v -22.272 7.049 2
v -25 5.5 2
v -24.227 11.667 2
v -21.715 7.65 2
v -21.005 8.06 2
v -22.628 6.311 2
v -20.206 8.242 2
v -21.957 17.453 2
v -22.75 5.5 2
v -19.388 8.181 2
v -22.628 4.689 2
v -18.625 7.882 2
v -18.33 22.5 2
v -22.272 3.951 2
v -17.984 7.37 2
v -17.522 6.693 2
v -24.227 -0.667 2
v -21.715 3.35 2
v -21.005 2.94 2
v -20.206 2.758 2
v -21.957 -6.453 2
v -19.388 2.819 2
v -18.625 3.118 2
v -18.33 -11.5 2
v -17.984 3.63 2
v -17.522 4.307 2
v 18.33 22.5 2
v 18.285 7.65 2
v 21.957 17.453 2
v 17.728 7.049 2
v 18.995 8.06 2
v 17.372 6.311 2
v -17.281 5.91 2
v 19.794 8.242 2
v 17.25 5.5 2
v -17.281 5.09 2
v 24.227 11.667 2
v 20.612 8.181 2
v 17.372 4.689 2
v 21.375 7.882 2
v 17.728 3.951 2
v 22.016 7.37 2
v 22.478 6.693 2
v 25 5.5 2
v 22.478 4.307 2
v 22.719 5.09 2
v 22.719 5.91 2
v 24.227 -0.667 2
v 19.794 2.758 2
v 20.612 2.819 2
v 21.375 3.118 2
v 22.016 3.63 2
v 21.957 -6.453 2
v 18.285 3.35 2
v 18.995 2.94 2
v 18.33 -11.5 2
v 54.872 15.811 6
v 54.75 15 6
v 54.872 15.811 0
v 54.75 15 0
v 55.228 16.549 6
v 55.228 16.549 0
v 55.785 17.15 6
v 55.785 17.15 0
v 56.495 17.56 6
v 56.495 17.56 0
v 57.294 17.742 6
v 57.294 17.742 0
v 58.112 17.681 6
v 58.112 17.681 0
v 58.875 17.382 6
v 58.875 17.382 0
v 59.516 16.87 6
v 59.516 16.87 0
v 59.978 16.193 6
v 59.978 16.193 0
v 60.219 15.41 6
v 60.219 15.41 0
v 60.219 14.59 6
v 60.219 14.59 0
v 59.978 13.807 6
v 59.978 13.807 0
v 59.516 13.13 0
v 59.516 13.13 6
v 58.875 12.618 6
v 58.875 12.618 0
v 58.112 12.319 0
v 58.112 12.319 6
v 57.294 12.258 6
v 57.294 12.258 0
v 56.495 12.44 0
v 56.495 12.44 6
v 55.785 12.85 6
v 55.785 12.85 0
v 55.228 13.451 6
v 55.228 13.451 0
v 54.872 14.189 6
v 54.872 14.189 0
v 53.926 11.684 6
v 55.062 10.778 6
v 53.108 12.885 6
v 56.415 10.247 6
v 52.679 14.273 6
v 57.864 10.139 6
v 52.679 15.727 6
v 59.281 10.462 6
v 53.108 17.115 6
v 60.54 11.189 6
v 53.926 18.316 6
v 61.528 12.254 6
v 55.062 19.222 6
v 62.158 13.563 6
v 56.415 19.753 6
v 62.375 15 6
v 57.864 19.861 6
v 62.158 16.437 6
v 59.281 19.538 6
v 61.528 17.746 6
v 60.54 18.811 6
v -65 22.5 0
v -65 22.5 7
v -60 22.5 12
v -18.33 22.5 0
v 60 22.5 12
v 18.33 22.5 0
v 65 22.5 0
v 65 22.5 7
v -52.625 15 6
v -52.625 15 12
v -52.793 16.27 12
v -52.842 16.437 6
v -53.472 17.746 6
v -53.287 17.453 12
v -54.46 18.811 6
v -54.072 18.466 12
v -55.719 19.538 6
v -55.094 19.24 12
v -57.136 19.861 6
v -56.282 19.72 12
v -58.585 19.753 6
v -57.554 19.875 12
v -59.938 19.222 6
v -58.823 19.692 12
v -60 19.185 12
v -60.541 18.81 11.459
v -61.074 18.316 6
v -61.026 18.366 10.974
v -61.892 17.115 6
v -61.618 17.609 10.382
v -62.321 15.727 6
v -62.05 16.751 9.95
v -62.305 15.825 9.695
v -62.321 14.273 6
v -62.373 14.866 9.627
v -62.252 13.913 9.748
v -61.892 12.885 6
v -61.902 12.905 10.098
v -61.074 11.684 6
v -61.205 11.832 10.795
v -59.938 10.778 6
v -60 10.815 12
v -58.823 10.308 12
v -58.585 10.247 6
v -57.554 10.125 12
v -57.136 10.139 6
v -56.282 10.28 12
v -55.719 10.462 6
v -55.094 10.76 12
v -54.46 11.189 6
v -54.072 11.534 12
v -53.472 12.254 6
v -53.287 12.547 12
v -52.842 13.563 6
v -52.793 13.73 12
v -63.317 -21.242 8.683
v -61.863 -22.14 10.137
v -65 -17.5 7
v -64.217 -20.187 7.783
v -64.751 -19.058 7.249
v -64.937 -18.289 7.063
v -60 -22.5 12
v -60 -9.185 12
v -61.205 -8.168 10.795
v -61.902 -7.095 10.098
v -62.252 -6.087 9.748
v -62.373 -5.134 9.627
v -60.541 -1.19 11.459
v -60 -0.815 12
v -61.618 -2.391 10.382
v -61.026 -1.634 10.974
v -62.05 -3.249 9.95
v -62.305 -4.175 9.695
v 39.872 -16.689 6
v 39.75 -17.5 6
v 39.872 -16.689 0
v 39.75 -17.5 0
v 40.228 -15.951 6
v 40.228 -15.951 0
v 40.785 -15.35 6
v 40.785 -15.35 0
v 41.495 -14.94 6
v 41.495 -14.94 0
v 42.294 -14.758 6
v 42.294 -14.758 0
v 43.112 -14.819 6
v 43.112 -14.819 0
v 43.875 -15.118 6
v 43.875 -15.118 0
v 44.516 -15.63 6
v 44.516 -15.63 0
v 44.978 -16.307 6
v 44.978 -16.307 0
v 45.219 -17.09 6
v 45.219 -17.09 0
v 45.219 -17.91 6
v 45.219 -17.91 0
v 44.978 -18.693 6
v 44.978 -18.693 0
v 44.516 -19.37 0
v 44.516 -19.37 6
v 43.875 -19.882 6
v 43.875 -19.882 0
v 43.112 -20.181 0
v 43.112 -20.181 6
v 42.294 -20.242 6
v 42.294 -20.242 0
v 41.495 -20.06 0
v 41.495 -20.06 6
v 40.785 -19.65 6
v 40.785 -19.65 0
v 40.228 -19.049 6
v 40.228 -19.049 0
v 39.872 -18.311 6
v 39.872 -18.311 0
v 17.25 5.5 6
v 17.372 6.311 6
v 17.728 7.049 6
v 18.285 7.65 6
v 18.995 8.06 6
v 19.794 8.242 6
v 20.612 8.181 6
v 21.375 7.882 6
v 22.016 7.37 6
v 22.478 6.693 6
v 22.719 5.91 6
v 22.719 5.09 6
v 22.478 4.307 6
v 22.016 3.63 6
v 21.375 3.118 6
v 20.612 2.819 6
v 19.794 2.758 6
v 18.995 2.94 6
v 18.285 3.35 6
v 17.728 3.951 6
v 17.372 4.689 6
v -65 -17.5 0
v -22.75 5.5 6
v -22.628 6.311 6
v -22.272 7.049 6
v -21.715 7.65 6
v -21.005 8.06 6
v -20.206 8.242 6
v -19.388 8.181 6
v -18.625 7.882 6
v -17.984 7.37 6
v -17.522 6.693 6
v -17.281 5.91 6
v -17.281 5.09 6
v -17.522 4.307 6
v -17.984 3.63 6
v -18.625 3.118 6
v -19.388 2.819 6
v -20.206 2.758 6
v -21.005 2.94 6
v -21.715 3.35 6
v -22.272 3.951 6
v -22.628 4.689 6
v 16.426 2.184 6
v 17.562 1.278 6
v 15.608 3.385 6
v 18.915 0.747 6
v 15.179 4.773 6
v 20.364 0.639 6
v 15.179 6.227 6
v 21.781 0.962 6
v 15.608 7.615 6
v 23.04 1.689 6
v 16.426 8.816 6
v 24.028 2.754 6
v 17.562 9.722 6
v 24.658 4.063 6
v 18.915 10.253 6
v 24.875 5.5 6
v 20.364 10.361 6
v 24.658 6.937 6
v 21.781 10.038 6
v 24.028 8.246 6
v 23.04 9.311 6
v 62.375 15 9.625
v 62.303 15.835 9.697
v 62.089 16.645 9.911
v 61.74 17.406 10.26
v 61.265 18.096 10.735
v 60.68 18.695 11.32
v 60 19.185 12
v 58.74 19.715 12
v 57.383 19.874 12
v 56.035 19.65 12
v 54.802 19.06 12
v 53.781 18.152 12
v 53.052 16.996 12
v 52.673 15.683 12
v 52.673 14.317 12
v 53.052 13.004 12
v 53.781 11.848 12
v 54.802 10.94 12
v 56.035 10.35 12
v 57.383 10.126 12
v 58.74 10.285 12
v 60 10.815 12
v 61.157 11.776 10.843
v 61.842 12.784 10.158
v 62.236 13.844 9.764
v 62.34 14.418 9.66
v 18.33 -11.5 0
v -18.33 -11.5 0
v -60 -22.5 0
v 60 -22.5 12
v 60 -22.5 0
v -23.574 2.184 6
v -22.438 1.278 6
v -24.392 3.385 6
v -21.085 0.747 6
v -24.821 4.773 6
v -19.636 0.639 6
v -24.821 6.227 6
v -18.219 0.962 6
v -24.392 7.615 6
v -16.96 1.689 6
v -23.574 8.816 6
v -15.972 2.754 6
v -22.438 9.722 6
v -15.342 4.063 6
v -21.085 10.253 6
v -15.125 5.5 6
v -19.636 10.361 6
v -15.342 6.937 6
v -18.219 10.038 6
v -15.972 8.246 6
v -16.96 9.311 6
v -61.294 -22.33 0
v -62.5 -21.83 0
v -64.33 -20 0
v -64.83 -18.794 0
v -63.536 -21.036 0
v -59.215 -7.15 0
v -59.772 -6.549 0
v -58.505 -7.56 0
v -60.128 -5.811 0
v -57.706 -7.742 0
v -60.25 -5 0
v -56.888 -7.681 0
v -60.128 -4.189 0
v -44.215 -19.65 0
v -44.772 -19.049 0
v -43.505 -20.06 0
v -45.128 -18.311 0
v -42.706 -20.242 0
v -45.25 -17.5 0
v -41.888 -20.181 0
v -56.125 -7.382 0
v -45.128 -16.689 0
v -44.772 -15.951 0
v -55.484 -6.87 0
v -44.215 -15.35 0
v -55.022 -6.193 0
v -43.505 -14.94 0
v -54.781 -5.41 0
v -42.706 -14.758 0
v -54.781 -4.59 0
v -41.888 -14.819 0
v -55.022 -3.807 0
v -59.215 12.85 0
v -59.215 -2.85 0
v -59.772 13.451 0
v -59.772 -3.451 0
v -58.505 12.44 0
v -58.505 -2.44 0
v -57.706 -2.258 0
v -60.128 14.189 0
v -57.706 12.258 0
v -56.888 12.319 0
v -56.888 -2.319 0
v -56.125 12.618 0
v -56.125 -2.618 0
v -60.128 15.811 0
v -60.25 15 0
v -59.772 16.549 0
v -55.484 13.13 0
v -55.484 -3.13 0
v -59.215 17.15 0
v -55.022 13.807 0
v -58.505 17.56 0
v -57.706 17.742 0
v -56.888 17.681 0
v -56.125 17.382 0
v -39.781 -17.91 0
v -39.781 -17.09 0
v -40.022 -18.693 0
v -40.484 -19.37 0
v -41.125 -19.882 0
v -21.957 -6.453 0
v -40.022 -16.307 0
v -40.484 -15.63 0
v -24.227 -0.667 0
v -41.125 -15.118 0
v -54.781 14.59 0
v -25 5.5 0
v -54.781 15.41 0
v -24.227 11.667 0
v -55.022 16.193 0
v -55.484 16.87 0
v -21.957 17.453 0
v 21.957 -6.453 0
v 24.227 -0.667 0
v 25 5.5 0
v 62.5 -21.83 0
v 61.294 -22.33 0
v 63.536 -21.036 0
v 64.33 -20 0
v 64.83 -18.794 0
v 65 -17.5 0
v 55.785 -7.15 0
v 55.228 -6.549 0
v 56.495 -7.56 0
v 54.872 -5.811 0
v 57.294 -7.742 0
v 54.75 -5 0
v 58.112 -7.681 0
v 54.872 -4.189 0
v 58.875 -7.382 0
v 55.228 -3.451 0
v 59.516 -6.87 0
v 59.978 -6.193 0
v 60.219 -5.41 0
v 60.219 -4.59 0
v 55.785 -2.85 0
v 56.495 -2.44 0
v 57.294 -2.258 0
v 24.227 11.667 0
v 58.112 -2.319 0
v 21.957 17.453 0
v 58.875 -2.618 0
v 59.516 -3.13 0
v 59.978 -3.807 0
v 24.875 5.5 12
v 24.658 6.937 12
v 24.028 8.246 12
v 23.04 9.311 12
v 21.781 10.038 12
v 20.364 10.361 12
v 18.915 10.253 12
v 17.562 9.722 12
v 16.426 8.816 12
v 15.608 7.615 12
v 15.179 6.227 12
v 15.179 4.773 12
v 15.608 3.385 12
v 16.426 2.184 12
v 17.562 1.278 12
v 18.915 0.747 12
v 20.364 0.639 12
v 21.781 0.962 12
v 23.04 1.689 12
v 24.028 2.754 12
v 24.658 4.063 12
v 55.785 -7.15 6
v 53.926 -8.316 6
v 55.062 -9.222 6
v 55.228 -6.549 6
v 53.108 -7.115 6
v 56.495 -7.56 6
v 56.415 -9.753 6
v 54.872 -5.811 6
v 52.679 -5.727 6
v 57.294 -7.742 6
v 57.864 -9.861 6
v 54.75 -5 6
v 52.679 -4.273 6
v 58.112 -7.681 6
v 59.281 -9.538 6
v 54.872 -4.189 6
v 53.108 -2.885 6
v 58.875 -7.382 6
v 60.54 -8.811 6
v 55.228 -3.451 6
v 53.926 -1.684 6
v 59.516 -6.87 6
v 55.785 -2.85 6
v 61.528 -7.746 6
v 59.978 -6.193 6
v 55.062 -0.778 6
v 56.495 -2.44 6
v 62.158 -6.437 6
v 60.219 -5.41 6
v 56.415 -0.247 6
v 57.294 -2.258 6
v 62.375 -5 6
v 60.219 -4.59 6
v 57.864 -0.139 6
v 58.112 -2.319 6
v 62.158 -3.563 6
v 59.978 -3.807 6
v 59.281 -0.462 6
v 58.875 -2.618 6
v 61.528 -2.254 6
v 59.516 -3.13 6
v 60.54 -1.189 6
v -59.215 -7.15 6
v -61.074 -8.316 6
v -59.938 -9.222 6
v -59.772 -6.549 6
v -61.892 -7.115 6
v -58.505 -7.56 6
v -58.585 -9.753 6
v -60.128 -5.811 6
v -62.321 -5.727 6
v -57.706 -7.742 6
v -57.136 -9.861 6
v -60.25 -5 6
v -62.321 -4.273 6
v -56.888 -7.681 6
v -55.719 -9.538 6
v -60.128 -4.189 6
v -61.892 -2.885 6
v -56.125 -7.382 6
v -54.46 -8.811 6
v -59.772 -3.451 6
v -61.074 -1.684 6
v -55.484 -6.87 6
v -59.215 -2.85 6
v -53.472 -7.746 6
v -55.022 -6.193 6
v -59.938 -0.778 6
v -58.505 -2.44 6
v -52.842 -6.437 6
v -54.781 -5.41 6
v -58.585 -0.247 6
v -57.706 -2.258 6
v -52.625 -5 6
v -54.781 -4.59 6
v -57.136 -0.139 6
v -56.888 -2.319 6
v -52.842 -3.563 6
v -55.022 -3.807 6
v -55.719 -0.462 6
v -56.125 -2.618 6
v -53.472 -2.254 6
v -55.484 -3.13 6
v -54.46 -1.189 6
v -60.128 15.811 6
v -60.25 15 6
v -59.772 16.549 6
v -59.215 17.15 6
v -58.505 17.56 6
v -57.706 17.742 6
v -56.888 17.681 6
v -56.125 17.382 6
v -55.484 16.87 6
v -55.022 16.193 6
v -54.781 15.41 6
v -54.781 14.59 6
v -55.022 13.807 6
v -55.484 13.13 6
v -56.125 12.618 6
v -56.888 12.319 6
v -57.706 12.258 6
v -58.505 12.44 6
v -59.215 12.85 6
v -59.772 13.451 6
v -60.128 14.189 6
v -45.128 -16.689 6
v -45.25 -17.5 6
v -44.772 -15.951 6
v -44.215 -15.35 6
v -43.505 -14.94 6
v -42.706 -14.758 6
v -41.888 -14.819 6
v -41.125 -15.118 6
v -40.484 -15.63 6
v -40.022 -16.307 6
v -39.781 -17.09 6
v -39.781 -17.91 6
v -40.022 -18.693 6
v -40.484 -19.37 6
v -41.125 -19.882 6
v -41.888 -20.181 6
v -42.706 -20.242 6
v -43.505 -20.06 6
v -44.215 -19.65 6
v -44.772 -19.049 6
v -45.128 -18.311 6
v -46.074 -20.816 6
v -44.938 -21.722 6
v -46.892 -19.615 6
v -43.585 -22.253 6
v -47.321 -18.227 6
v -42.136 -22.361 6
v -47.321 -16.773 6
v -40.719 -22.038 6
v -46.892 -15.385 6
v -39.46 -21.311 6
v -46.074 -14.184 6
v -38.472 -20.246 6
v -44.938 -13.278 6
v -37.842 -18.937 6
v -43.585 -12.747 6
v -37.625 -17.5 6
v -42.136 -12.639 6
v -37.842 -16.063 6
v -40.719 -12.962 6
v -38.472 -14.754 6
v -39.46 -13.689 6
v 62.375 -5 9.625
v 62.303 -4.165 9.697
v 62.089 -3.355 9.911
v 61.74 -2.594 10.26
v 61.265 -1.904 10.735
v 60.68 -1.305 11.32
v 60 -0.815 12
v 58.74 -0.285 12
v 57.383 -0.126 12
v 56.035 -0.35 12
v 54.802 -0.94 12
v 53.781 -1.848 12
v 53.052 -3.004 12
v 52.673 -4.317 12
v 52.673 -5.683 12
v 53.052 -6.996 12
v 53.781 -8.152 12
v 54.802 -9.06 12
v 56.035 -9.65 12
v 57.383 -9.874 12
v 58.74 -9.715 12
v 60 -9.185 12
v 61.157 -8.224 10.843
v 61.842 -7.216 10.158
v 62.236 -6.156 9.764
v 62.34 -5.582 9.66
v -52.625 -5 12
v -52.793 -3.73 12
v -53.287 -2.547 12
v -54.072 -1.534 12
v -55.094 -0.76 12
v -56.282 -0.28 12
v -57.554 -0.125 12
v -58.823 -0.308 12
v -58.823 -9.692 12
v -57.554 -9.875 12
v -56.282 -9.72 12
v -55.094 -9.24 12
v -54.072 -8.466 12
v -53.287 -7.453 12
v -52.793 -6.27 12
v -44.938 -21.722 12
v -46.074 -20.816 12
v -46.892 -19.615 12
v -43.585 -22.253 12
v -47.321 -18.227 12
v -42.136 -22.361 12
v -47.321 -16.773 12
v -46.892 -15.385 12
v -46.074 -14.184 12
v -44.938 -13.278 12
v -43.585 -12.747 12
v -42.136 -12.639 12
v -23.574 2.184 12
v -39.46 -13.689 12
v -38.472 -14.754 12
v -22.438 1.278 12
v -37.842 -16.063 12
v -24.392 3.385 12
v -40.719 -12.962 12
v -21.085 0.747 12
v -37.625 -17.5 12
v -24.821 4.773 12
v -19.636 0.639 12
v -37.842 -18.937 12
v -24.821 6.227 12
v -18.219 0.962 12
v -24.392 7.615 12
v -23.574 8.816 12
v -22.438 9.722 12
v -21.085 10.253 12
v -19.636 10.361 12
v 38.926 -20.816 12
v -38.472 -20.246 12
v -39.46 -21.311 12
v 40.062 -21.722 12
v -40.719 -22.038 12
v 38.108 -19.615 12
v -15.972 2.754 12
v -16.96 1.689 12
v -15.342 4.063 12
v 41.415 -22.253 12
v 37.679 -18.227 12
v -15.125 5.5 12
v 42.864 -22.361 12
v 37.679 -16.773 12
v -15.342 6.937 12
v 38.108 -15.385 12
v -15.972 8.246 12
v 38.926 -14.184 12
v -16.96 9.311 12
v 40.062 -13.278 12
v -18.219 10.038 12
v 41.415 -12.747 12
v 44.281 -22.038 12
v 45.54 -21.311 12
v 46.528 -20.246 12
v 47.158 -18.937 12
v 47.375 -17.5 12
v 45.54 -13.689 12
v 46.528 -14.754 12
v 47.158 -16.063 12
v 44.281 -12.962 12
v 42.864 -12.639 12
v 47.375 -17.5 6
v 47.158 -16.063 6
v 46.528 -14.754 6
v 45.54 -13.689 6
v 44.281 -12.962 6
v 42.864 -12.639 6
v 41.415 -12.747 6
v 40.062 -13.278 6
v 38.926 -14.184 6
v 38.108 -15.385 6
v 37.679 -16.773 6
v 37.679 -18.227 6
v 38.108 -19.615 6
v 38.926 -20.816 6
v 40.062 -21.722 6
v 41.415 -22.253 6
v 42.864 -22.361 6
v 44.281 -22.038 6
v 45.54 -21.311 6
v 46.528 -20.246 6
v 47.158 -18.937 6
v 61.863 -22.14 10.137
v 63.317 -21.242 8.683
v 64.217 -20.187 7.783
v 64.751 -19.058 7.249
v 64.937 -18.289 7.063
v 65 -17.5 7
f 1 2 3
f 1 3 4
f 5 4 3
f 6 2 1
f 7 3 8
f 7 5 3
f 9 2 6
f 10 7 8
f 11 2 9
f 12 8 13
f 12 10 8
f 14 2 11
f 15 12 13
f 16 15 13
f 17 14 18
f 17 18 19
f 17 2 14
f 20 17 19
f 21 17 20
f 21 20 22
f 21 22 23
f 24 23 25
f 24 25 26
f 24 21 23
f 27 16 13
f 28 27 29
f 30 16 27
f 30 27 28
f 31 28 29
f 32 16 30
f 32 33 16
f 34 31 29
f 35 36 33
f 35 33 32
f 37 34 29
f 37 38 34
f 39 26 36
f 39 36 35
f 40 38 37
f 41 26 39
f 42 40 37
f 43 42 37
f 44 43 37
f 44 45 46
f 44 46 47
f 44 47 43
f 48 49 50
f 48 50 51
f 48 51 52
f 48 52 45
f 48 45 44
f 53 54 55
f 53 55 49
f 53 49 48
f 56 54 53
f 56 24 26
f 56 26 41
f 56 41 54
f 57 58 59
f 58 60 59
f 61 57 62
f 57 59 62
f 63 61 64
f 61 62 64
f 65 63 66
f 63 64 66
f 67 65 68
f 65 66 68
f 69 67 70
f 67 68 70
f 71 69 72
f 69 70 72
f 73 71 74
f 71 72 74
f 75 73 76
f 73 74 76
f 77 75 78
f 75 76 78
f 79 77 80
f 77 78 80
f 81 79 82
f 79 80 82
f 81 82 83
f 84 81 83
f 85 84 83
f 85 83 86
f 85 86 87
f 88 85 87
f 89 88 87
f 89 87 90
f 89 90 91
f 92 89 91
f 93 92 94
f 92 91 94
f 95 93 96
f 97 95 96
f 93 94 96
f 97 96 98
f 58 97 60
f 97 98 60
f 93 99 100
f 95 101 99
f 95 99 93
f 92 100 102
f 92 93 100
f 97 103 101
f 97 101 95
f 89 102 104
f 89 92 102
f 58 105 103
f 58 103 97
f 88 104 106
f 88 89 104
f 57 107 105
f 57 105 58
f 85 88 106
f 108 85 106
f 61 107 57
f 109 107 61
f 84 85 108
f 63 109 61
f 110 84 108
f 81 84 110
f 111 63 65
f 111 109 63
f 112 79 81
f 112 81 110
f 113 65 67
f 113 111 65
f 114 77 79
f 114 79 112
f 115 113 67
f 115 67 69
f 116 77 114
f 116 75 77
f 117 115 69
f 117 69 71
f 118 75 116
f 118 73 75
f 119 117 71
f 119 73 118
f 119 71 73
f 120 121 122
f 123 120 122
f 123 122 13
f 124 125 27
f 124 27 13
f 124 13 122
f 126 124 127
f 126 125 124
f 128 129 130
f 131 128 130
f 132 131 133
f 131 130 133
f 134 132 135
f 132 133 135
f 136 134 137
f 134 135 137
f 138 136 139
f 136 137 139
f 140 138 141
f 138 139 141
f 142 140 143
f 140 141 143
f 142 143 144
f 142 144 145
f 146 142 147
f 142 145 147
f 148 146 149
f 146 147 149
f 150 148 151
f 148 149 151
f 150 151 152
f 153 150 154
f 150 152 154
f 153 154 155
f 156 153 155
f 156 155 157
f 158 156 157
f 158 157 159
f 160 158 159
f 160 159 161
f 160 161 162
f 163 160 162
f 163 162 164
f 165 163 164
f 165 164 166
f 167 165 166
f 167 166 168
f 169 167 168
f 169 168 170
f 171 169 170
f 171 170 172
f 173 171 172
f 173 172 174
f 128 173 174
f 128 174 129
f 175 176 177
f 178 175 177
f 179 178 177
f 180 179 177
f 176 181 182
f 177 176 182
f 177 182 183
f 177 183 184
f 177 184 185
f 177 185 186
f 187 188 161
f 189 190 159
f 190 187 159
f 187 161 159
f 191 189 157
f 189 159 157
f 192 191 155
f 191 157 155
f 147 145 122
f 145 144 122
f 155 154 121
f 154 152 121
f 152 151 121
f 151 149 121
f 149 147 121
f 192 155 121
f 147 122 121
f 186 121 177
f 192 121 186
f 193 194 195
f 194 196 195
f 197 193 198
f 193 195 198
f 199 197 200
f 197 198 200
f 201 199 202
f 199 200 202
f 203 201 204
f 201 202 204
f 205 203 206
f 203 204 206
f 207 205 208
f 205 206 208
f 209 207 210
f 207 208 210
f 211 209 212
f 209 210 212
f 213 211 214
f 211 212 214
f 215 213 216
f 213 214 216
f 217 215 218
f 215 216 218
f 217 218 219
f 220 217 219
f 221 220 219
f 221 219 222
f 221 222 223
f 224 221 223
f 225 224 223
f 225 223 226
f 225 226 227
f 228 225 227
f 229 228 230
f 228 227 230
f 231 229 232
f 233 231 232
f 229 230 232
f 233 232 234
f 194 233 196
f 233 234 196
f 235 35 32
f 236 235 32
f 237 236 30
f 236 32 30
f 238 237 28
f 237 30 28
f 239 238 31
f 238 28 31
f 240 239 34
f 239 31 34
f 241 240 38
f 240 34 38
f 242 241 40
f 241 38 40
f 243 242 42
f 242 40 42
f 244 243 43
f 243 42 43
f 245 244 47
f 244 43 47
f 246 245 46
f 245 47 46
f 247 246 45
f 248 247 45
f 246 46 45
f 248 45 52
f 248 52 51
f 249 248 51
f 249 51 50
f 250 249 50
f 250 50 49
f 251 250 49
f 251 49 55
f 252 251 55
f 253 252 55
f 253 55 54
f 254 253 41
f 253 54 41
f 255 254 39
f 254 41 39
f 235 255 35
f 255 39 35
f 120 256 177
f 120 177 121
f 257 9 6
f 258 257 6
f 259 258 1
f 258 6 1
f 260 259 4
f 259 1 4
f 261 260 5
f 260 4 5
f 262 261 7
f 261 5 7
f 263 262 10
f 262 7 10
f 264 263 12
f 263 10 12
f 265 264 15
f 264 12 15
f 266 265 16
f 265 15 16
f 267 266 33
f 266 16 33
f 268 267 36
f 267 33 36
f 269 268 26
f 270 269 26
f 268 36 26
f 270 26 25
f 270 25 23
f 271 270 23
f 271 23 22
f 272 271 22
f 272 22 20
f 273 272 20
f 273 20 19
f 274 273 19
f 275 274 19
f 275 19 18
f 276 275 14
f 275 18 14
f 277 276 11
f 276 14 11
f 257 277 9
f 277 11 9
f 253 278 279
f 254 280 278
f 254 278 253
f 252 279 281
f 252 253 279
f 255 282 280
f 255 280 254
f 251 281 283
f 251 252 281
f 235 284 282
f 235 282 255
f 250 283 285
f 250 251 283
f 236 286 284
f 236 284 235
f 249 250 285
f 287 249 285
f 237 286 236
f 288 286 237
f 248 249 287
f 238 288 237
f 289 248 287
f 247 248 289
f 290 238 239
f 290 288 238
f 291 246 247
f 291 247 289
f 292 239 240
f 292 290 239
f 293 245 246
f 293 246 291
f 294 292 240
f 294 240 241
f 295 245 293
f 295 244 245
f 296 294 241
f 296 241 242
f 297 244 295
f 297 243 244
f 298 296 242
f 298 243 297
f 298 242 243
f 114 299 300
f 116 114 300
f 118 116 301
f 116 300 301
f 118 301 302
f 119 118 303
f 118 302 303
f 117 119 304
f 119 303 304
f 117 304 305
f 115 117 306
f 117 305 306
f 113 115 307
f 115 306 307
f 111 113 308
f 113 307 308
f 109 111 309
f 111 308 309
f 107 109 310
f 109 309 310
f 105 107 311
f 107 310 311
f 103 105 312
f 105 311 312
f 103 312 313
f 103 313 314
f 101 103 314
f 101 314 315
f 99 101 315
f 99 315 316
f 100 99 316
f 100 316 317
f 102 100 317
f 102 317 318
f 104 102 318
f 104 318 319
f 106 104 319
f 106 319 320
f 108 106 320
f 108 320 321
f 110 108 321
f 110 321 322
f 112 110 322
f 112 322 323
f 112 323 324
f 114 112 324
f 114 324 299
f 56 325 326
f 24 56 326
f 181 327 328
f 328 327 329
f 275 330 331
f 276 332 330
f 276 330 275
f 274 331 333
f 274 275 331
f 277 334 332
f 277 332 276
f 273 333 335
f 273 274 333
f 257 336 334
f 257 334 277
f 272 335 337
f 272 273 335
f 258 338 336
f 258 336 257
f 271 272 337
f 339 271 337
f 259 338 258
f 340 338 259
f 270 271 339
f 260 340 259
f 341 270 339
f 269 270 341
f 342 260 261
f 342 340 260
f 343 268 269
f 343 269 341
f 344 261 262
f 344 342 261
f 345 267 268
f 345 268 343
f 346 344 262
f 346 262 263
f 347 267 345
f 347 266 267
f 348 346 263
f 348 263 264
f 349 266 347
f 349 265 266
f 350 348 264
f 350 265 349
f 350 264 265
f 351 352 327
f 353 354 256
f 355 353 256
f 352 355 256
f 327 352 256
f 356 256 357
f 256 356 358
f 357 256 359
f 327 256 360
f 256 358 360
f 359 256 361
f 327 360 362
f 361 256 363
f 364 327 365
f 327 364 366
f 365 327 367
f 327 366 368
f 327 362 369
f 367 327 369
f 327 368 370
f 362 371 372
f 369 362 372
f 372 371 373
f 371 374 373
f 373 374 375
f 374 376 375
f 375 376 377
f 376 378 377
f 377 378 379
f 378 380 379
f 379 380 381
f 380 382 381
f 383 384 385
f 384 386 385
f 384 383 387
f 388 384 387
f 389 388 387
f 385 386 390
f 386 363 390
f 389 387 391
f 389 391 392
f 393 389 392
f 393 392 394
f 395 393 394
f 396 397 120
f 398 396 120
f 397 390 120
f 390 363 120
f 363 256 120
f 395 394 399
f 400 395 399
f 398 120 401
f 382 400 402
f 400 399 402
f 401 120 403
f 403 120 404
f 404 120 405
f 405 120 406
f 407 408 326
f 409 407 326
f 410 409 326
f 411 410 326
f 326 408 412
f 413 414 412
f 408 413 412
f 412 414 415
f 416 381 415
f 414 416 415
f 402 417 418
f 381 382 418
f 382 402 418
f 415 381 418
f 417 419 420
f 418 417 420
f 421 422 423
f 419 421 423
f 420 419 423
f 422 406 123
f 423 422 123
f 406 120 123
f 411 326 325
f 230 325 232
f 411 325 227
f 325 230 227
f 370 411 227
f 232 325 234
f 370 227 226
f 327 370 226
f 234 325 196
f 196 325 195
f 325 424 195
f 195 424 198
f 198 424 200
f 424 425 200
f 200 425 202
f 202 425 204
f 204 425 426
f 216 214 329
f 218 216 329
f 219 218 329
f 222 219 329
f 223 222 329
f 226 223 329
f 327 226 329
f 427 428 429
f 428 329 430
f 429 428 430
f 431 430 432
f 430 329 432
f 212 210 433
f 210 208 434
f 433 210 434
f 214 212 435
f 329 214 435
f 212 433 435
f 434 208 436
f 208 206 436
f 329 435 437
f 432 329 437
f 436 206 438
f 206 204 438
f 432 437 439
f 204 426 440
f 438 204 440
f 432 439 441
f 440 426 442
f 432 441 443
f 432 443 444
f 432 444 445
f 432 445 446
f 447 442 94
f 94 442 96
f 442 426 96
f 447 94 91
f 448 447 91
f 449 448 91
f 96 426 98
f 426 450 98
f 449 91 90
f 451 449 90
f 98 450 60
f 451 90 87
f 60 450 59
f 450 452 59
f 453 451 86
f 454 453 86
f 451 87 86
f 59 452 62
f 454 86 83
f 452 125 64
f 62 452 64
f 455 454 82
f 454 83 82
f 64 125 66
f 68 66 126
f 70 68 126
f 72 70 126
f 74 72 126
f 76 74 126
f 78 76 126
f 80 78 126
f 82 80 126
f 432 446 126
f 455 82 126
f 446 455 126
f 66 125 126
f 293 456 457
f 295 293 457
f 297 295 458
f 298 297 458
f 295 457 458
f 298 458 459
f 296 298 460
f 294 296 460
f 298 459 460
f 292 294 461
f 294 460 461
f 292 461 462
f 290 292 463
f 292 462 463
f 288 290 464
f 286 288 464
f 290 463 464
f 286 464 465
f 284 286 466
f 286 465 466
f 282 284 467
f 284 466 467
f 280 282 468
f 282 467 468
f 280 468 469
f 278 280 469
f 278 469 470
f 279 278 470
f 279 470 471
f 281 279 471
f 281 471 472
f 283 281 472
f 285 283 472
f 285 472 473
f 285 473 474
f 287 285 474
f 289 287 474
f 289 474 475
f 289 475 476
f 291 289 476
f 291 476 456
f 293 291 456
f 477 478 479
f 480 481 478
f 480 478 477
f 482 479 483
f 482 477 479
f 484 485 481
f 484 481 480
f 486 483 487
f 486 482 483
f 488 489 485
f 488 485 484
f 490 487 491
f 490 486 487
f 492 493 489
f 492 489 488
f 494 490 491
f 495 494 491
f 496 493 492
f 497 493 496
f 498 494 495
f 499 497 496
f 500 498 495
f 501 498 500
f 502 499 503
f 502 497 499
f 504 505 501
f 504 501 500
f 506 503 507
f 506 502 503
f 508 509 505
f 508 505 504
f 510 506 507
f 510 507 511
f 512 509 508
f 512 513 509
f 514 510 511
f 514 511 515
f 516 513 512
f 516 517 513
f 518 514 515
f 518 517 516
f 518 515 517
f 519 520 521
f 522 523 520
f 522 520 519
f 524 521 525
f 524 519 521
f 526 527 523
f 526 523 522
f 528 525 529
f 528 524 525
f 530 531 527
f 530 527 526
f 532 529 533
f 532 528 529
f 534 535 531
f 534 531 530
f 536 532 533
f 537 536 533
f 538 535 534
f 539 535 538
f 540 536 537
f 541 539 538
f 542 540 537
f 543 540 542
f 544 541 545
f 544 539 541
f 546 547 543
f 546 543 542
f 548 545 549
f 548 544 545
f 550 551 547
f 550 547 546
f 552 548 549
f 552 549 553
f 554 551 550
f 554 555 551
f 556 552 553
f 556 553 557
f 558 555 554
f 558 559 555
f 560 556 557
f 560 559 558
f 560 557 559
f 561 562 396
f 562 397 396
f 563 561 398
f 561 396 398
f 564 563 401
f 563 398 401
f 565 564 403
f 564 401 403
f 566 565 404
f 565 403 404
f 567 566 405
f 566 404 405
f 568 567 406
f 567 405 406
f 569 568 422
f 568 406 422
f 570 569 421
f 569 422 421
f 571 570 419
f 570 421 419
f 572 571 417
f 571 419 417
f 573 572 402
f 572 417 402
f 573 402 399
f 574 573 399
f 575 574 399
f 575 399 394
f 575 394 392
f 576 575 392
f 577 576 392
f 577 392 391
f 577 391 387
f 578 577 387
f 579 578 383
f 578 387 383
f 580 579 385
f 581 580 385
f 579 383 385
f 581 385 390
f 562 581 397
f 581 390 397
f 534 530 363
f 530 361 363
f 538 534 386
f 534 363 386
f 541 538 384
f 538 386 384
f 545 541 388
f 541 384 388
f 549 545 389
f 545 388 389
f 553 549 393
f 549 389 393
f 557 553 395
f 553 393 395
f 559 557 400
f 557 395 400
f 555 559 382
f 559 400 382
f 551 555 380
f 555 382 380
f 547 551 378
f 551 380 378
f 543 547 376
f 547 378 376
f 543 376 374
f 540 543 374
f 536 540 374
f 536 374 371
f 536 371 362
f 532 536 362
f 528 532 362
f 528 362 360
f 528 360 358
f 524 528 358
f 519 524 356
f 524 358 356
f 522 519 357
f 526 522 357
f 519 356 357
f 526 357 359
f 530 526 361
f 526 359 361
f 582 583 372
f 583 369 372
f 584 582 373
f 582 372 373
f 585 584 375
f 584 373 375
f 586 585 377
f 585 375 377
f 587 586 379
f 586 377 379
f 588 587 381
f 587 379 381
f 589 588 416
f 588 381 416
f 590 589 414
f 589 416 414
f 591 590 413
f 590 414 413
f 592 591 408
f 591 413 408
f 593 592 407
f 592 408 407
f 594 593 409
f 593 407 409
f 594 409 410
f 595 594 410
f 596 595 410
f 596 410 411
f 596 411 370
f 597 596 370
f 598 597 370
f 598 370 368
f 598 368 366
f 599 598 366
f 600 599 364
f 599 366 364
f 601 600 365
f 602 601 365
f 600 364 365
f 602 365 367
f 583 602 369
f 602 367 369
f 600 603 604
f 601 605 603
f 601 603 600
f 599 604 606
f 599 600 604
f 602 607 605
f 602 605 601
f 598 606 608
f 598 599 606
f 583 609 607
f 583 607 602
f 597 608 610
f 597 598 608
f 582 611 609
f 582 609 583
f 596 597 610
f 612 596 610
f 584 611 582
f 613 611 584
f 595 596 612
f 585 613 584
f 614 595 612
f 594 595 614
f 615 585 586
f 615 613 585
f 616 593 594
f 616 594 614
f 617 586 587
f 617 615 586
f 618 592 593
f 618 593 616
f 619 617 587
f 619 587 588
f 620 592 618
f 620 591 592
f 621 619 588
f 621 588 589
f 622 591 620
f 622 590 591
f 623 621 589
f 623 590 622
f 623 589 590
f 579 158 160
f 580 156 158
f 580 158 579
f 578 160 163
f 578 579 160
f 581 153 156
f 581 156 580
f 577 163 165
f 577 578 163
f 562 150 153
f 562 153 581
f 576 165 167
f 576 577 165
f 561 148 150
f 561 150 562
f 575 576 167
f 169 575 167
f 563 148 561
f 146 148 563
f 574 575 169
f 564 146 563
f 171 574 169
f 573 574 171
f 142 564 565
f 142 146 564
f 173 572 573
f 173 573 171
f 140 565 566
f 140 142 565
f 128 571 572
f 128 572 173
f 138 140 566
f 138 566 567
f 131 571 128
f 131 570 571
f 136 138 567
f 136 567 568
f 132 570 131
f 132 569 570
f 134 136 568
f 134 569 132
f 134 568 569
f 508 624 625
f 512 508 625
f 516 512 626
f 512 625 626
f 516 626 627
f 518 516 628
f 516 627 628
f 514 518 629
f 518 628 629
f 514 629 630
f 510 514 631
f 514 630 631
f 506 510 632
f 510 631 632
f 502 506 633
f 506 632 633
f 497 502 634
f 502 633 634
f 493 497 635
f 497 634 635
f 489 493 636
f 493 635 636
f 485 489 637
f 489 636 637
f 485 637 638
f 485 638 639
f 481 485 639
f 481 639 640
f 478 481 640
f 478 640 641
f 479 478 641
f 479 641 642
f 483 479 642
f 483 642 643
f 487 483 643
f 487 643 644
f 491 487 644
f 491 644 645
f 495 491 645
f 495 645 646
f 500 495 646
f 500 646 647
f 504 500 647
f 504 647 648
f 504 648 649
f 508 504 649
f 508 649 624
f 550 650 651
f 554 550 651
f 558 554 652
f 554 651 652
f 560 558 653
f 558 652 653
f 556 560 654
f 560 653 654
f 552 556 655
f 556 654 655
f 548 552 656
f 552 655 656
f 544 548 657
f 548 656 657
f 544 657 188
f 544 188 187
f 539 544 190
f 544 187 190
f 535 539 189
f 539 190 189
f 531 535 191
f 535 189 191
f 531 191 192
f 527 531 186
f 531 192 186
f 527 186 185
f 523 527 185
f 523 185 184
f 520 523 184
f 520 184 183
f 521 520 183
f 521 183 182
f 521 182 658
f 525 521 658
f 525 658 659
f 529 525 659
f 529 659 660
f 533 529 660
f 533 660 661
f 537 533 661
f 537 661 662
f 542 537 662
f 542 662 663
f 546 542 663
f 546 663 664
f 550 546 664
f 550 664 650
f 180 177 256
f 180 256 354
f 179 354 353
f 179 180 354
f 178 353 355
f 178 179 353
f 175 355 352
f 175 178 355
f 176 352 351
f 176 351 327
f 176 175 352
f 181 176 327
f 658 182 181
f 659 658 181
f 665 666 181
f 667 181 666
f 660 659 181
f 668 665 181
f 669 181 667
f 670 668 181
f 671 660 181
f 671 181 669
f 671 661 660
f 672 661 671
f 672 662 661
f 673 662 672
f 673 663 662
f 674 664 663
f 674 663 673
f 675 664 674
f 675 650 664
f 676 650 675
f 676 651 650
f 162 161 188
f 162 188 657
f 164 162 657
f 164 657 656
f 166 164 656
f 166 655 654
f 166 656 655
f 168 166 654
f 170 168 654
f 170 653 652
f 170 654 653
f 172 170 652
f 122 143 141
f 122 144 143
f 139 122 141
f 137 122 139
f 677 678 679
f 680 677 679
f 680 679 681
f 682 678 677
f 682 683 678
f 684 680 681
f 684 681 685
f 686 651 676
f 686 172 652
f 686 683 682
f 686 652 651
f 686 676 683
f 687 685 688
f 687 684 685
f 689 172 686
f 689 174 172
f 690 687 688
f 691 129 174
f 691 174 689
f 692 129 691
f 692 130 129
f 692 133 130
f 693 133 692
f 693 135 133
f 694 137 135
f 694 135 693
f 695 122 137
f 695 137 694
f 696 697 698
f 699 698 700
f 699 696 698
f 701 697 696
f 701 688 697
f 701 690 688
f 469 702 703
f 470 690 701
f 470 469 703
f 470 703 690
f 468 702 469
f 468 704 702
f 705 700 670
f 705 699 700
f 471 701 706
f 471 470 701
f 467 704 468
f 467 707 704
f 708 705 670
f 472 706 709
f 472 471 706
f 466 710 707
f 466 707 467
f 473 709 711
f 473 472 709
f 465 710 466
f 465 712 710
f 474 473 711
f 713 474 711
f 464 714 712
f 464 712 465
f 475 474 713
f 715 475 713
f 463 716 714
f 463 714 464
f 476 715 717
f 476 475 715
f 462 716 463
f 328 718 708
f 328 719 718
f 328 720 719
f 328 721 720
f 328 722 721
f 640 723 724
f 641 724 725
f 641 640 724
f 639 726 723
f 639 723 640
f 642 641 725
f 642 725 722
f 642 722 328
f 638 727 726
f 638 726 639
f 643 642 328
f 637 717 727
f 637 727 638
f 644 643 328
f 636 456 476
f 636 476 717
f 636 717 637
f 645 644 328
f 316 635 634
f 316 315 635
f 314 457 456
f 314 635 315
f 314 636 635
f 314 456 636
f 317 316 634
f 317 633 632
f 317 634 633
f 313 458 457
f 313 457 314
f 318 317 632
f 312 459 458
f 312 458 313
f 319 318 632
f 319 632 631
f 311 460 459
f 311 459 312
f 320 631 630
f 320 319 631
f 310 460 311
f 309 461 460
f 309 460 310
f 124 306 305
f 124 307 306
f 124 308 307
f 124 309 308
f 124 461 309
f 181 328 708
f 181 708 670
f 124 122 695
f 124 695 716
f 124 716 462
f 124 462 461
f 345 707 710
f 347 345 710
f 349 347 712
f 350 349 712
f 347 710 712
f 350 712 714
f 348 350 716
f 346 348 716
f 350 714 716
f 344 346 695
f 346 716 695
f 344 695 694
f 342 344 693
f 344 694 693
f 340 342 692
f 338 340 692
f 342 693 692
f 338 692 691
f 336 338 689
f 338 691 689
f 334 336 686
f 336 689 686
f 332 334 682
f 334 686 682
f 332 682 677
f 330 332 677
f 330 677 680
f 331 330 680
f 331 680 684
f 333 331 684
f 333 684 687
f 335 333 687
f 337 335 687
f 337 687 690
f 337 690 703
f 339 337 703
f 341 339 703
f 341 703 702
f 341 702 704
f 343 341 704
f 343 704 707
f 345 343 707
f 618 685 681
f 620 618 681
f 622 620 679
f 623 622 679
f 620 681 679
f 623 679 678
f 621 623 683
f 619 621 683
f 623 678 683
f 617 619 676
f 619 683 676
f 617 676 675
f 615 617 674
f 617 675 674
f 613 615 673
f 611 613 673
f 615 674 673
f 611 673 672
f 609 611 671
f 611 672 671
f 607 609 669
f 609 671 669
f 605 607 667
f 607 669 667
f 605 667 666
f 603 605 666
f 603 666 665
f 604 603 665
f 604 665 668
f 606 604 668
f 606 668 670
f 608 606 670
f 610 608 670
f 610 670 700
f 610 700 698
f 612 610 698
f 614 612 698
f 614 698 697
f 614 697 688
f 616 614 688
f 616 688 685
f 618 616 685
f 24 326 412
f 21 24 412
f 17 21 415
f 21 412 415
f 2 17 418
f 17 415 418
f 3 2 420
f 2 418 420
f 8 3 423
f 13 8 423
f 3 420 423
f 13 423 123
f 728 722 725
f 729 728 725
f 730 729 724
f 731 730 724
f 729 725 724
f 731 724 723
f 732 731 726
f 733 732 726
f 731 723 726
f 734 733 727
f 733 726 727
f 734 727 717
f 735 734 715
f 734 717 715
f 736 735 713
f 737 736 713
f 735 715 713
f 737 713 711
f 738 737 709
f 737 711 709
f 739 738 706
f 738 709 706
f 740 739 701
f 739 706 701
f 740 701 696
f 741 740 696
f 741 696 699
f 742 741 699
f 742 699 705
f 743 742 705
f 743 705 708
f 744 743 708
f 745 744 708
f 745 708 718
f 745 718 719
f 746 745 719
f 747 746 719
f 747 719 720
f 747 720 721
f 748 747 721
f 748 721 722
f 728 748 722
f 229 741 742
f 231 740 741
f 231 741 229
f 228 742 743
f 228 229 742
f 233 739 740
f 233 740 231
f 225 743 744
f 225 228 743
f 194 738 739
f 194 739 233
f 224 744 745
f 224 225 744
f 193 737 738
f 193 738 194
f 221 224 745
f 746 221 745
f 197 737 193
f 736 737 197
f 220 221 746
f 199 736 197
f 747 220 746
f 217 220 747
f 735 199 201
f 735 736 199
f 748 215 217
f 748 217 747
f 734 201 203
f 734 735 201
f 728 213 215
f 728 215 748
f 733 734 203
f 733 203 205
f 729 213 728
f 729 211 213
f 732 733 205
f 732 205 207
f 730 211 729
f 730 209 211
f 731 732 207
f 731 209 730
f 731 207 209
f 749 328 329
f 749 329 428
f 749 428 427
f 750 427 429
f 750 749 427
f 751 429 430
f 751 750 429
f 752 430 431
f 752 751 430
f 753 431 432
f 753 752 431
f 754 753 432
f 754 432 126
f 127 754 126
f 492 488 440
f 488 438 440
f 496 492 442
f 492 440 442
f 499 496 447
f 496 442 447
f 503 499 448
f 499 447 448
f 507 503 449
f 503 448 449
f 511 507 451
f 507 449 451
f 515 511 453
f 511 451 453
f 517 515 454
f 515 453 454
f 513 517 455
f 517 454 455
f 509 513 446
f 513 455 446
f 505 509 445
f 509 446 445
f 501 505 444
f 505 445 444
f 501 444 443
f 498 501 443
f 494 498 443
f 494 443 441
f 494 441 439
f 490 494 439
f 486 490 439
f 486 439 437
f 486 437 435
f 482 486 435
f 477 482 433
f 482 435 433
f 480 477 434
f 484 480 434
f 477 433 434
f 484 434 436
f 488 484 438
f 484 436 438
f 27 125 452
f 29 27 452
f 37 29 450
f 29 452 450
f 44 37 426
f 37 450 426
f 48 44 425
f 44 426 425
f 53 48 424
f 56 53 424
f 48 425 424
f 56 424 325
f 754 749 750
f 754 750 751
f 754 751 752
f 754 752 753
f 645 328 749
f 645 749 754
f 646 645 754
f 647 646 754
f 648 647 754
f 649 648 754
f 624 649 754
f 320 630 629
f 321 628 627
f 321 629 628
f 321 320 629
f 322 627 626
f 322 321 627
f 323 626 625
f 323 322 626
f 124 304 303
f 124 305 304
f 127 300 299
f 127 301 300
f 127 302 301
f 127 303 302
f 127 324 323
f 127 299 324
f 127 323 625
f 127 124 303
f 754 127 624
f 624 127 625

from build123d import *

# Parameters (mm, degrees)
F0_W                 = 130
F0_H                 = 45
F1_DEPTH             = 12
F2_R                 = 5
F5_D                 = 5.5
F5_CBORE_D           = 9.75
F5_CBORE_DEPTH       = 6
F5_ON_F4_D           = 5.5
F5_ON_F4_CBORE_D     = 9.75
F5_ON_F4_CBORE_DEPTH = 6
F6_T1_DEPTH          = 65.7168298797
F7_R                 = 2.75
F8_DEPTH             = 2


# Not quite as in the source:
# - a fillet or chamfer that OpenCascade refuses, or shapes differently, is made with other operations: its cross-section is extruded or revolved along the edge and cut away or added


with BuildPart() as f1:
    # F0 (on Top) → F1 (new body)
    with BuildSketch(Plane.XY):
        Rectangle(F0_W, F0_H)
    extrude(amount=F1_DEPTH)

    # F2
    f2_edges = [f1.edges().sort_by_distance(p)[0] for p in [
        (65, -22.5, 6),
        (-65, -22.5, 6),
    ]]
    fillet(f2_edges, radius=F2_R)

    # F5 (through all)
    with Locations(Plane.XY.offset(12)):
        with Locations((-57.5, -5), (-57.5, 15), (57.5, -5), (57.5, 15), (-42.5, -17.5), (42.5, -17.5)):
            CounterBoreHole(F5_D / 2, F5_CBORE_D / 2, F5_CBORE_DEPTH)

    # F5 on F4 (through all)
    with Locations(Plane.XY.offset(12)):
        with Locations((-20, 5.5), (20, 5.5)):
            CounterBoreHole(F5_ON_F4_D / 2, F5_ON_F4_CBORE_D / 2, F5_ON_F4_CBORE_DEPTH)

    # F6: chamfer of 5 on 2 edges, made by hand

    # F6_s2 → F6_t1 (cut)
    with BuildSketch(Plane.XZ.offset(-35.3584149398)):
        Polygon((-60, 12), (-65, 7), (-65, 12), align=None)
        Polygon((60, 12), (65, 7), (65, 12), align=None)
    extrude(amount=F6_T1_DEPTH, mode=Mode.SUBTRACT)

    # F7 (on face) → F8 (cut)
    with BuildSketch(Plane(origin=(0, 0, 0), x_dir=(1, 0, 0), z_dir=(0, 0, -1))):
        with BuildLine():
            Line((-18.3303027798, -22.5), (18.3303027798, -22.5))
            ThreePointArc((18.3303027798, -22.5), (25, -5.5), (18.3303027798, 11.5))
            Line((18.3303027798, 11.5), (-18.3303027798, 11.5))
            ThreePointArc((-18.3303027798, 11.5), (-25, -5.5), (-18.3303027798, -22.5))
        make_face()
        with Locations((-20, -5.5)):
            Circle(F7_R, mode=Mode.SUBTRACT)
        with Locations((20, -5.5)):
            Circle(F7_R, mode=Mode.SUBTRACT)
    extrude(amount=-F8_DEPTH, mode=Mode.SUBTRACT)


solid = f1.part
